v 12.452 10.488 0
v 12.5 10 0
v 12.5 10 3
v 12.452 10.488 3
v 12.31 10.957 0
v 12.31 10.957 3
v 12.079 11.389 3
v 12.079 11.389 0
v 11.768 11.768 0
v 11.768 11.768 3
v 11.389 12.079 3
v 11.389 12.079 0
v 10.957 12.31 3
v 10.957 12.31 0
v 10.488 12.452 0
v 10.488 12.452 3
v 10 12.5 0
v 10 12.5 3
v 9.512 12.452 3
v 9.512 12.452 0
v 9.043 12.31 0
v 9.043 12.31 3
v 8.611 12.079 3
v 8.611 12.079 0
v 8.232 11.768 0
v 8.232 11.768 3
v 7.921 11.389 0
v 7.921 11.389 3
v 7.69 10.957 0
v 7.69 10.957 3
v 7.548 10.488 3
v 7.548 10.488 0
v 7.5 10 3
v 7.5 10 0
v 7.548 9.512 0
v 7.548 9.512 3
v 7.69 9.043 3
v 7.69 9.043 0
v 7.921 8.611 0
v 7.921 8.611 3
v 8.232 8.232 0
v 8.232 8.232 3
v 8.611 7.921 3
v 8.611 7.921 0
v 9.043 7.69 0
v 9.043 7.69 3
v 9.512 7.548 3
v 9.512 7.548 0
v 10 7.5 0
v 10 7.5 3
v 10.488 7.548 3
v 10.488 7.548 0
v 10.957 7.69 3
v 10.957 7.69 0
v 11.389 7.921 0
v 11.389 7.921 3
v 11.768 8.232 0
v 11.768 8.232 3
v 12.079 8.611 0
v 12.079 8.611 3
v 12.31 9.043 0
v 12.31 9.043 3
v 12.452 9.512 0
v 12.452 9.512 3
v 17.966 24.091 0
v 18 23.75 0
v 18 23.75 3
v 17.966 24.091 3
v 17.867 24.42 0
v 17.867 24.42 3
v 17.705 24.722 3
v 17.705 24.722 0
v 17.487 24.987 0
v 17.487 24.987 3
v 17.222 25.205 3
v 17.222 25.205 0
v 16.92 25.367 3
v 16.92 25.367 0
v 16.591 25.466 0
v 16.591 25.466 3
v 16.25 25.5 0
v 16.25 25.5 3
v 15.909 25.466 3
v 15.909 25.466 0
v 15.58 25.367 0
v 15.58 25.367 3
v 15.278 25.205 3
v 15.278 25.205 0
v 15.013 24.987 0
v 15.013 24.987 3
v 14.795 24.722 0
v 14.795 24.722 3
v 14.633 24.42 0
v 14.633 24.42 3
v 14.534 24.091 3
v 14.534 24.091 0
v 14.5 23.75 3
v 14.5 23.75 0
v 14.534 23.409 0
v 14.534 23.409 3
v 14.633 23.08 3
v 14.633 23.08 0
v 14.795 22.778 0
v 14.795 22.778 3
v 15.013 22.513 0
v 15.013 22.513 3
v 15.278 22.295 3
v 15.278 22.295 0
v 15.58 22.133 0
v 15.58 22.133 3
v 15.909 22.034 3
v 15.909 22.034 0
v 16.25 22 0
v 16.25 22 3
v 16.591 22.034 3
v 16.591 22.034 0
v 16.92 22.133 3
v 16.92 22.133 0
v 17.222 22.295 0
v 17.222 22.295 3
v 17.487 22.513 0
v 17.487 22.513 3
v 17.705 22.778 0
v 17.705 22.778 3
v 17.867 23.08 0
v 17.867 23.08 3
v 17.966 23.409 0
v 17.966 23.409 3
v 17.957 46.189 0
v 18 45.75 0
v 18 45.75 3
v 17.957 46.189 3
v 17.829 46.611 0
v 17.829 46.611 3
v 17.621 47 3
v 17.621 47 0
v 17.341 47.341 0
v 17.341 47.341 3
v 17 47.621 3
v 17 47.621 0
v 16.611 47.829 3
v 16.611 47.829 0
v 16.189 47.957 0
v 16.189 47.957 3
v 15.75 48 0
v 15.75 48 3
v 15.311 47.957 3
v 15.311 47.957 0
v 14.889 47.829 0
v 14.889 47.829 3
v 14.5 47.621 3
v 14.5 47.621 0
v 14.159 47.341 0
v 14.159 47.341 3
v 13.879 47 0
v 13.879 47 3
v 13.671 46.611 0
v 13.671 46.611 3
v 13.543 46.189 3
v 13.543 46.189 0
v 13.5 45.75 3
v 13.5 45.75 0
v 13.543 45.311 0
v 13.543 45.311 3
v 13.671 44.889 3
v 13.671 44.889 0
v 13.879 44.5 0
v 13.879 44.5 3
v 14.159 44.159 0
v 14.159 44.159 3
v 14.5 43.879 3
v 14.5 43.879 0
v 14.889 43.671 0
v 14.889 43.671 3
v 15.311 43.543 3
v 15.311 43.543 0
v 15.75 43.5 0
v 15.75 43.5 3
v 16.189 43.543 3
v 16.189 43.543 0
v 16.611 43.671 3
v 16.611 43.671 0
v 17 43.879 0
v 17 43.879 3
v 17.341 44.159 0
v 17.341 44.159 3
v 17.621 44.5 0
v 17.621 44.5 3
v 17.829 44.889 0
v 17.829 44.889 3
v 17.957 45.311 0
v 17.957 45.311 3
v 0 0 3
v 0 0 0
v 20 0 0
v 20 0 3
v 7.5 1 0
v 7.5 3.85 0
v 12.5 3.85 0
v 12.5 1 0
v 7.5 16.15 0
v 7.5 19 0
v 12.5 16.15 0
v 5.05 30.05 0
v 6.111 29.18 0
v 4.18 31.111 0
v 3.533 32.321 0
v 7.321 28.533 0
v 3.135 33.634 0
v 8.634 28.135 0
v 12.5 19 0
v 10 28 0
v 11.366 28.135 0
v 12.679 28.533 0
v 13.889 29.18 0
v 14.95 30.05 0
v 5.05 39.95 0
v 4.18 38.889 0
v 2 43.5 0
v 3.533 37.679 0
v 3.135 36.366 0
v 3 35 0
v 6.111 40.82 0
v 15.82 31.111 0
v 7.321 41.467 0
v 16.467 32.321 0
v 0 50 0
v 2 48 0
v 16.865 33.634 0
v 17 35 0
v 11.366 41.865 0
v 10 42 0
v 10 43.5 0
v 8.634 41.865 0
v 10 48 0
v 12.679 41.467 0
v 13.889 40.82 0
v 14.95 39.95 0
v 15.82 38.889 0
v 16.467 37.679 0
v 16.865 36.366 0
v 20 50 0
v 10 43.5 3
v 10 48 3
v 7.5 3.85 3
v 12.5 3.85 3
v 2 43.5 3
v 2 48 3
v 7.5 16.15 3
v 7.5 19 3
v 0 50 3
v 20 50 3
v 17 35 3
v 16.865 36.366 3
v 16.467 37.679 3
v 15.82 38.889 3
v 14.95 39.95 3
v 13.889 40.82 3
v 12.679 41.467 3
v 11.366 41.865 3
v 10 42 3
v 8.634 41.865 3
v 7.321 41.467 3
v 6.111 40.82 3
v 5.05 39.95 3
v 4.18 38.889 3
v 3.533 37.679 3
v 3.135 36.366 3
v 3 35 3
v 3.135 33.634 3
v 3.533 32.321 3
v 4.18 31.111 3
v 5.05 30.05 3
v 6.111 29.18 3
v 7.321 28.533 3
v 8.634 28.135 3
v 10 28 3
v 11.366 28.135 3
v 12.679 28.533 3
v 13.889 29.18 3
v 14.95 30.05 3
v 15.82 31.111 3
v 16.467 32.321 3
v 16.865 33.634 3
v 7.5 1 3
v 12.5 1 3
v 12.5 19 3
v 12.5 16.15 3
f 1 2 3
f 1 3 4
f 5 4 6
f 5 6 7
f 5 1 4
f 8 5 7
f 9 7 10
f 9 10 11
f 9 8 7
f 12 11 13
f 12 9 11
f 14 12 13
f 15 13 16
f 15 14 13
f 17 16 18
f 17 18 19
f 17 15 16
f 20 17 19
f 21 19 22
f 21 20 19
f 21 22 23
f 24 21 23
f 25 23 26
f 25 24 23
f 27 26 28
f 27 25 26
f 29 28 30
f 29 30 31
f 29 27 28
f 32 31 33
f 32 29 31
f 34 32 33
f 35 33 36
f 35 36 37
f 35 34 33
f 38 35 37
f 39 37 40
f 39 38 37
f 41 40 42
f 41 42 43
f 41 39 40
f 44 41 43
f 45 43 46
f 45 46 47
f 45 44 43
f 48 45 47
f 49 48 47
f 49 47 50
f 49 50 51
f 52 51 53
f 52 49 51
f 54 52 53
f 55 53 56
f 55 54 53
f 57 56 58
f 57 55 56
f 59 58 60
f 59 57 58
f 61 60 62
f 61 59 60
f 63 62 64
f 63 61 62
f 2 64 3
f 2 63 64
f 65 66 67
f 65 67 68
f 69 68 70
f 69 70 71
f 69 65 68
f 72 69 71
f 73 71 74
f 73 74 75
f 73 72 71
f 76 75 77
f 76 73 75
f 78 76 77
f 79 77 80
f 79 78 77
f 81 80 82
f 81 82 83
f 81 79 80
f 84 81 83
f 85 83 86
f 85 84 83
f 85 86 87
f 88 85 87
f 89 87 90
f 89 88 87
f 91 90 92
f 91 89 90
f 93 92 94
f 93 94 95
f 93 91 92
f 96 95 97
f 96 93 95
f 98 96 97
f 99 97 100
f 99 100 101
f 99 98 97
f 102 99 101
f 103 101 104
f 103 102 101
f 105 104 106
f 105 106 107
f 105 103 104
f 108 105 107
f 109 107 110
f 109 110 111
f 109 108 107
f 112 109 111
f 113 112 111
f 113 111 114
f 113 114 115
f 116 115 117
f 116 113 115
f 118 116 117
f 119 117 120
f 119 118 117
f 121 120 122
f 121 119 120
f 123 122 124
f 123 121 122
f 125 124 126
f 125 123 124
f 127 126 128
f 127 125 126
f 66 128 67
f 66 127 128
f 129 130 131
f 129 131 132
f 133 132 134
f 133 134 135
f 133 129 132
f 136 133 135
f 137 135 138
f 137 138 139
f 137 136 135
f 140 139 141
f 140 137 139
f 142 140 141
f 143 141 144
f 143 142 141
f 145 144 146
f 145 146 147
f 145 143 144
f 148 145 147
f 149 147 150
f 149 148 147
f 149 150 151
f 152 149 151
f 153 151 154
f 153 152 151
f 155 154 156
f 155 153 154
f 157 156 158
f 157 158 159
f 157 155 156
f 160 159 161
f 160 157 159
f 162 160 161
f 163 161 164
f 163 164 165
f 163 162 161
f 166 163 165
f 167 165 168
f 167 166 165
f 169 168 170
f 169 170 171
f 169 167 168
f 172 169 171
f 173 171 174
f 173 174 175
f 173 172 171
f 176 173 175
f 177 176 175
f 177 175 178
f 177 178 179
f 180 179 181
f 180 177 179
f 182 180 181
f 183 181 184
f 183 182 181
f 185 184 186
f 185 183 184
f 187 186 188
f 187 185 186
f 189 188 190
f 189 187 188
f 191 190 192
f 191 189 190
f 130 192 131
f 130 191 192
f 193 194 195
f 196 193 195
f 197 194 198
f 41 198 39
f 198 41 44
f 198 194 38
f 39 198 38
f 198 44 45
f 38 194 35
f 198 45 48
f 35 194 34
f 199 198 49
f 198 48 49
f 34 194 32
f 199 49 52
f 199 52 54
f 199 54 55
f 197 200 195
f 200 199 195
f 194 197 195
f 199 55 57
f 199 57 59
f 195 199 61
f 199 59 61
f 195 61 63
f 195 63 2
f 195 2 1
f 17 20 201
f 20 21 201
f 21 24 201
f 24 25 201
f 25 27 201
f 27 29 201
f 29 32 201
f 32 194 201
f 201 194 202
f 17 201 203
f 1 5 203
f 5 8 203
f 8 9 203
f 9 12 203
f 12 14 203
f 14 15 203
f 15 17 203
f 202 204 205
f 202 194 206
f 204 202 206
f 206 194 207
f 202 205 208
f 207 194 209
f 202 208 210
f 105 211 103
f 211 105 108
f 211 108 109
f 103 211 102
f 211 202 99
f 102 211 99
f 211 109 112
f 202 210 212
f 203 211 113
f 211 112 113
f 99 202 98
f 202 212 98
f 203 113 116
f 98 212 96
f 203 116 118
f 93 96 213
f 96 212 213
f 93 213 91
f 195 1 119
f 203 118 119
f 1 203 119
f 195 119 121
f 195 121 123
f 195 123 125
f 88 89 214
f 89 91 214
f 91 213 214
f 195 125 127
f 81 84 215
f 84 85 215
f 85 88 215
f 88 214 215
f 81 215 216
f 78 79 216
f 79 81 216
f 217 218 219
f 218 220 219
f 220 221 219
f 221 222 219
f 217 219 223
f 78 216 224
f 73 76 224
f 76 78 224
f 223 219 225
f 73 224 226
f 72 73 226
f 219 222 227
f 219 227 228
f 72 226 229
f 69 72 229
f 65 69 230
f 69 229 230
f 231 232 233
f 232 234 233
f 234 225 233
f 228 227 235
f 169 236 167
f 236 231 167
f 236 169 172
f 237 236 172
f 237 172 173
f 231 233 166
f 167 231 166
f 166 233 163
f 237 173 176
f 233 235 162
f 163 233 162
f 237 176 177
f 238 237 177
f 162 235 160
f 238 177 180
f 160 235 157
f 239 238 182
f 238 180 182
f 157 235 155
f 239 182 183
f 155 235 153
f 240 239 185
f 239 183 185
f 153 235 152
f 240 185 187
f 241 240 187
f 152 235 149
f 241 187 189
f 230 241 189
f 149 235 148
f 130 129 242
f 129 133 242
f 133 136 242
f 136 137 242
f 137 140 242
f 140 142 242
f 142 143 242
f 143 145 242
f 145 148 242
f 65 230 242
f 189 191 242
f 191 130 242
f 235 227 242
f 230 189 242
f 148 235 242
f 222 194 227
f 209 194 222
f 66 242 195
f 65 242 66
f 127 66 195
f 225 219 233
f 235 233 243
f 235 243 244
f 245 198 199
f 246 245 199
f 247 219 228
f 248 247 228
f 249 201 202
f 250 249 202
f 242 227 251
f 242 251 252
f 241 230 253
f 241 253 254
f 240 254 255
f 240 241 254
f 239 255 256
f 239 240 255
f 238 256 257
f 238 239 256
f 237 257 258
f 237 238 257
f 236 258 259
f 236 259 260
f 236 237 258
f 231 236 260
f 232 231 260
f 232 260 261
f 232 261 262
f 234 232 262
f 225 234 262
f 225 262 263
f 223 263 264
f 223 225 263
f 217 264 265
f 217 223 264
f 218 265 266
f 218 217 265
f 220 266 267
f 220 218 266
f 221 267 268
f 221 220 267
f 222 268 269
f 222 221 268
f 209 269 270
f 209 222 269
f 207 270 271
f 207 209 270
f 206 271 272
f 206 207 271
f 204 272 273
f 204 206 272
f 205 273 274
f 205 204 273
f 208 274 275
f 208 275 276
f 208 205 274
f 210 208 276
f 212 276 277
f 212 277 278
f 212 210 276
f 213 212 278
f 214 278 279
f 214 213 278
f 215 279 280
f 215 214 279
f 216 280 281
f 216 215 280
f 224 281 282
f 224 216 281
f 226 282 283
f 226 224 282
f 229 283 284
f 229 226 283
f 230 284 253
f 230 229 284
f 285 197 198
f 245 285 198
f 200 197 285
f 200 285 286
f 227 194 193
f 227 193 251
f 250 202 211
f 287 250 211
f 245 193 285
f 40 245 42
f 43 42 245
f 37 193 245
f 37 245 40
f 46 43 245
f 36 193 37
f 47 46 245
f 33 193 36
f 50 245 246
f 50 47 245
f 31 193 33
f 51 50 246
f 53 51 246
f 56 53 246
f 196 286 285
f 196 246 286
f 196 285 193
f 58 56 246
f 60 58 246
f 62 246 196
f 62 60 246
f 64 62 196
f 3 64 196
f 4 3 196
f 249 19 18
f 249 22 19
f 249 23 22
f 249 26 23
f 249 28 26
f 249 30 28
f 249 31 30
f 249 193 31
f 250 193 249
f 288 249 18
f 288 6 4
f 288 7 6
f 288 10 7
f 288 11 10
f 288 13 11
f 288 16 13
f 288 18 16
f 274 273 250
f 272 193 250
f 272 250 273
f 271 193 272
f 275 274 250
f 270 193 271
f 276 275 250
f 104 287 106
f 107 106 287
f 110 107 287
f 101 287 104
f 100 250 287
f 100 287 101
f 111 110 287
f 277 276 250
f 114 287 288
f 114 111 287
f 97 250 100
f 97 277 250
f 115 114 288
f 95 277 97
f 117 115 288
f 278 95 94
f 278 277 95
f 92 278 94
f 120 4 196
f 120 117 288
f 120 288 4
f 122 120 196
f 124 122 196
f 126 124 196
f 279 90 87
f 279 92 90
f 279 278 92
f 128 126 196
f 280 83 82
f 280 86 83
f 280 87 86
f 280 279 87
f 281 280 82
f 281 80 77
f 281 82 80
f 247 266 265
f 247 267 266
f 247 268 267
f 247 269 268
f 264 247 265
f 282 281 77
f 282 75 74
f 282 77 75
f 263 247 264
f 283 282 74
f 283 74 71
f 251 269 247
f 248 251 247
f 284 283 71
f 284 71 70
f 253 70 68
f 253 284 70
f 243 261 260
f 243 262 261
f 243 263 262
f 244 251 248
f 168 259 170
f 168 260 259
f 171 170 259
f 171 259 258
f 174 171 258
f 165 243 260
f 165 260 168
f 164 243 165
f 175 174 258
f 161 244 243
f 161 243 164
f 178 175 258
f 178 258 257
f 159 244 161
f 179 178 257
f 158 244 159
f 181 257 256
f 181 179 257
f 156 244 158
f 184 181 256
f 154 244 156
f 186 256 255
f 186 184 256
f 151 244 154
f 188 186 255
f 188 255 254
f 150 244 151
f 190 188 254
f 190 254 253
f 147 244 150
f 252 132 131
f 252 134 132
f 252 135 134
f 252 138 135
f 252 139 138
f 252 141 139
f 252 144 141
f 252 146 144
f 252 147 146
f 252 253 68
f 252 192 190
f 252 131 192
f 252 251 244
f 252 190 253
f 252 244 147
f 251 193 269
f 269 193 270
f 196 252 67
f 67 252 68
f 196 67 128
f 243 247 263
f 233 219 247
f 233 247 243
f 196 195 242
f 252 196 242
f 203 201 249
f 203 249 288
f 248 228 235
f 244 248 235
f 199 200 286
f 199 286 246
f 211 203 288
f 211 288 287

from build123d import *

# Parameters (mm, degrees)
SKETCH1_W           = 20
SKETCH1_H           = 50
SKETCH1_R           = 1.75
SKETCH1_R_2         = 2.25
SKETCH1_R_3         = 2.5
SKETCH1_R_4         = 7
SKETCH1_W_2         = 8
SKETCH1_H_2         = 4.5
SKETCH1_W_3         = 5
SKETCH1_H_3         = 2.85
BOSS_EXTRUDE1_DEPTH = 3


with BuildPart() as part:
    # Sketch1 → Boss-Extrude1 (new body)
    with BuildSketch(Plane.XY):
        with Locations((10, 25)):
            Rectangle(SKETCH1_W, SKETCH1_H)
        with Locations((16.25, 23.75)):
            Circle(SKETCH1_R, mode=Mode.SUBTRACT)
        with Locations((15.75, 45.75)):
            Circle(SKETCH1_R_2, mode=Mode.SUBTRACT)
        with Locations((10, 10)):
            Circle(SKETCH1_R_3, mode=Mode.SUBTRACT)
        with Locations((10, 35)):
            Circle(SKETCH1_R_4, mode=Mode.SUBTRACT)
        with Locations((6, 45.75)):
            Rectangle(SKETCH1_W_2, SKETCH1_H_2, mode=Mode.SUBTRACT)
        with Locations((10, 2.425)):
            Rectangle(SKETCH1_W_3, SKETCH1_H_3, mode=Mode.SUBTRACT)
        with Locations((10, 17.575)):
            Rectangle(SKETCH1_W_3, SKETCH1_H_3, mode=Mode.SUBTRACT)
    extrude(amount=BOSS_EXTRUDE1_DEPTH)


solid = part.part
